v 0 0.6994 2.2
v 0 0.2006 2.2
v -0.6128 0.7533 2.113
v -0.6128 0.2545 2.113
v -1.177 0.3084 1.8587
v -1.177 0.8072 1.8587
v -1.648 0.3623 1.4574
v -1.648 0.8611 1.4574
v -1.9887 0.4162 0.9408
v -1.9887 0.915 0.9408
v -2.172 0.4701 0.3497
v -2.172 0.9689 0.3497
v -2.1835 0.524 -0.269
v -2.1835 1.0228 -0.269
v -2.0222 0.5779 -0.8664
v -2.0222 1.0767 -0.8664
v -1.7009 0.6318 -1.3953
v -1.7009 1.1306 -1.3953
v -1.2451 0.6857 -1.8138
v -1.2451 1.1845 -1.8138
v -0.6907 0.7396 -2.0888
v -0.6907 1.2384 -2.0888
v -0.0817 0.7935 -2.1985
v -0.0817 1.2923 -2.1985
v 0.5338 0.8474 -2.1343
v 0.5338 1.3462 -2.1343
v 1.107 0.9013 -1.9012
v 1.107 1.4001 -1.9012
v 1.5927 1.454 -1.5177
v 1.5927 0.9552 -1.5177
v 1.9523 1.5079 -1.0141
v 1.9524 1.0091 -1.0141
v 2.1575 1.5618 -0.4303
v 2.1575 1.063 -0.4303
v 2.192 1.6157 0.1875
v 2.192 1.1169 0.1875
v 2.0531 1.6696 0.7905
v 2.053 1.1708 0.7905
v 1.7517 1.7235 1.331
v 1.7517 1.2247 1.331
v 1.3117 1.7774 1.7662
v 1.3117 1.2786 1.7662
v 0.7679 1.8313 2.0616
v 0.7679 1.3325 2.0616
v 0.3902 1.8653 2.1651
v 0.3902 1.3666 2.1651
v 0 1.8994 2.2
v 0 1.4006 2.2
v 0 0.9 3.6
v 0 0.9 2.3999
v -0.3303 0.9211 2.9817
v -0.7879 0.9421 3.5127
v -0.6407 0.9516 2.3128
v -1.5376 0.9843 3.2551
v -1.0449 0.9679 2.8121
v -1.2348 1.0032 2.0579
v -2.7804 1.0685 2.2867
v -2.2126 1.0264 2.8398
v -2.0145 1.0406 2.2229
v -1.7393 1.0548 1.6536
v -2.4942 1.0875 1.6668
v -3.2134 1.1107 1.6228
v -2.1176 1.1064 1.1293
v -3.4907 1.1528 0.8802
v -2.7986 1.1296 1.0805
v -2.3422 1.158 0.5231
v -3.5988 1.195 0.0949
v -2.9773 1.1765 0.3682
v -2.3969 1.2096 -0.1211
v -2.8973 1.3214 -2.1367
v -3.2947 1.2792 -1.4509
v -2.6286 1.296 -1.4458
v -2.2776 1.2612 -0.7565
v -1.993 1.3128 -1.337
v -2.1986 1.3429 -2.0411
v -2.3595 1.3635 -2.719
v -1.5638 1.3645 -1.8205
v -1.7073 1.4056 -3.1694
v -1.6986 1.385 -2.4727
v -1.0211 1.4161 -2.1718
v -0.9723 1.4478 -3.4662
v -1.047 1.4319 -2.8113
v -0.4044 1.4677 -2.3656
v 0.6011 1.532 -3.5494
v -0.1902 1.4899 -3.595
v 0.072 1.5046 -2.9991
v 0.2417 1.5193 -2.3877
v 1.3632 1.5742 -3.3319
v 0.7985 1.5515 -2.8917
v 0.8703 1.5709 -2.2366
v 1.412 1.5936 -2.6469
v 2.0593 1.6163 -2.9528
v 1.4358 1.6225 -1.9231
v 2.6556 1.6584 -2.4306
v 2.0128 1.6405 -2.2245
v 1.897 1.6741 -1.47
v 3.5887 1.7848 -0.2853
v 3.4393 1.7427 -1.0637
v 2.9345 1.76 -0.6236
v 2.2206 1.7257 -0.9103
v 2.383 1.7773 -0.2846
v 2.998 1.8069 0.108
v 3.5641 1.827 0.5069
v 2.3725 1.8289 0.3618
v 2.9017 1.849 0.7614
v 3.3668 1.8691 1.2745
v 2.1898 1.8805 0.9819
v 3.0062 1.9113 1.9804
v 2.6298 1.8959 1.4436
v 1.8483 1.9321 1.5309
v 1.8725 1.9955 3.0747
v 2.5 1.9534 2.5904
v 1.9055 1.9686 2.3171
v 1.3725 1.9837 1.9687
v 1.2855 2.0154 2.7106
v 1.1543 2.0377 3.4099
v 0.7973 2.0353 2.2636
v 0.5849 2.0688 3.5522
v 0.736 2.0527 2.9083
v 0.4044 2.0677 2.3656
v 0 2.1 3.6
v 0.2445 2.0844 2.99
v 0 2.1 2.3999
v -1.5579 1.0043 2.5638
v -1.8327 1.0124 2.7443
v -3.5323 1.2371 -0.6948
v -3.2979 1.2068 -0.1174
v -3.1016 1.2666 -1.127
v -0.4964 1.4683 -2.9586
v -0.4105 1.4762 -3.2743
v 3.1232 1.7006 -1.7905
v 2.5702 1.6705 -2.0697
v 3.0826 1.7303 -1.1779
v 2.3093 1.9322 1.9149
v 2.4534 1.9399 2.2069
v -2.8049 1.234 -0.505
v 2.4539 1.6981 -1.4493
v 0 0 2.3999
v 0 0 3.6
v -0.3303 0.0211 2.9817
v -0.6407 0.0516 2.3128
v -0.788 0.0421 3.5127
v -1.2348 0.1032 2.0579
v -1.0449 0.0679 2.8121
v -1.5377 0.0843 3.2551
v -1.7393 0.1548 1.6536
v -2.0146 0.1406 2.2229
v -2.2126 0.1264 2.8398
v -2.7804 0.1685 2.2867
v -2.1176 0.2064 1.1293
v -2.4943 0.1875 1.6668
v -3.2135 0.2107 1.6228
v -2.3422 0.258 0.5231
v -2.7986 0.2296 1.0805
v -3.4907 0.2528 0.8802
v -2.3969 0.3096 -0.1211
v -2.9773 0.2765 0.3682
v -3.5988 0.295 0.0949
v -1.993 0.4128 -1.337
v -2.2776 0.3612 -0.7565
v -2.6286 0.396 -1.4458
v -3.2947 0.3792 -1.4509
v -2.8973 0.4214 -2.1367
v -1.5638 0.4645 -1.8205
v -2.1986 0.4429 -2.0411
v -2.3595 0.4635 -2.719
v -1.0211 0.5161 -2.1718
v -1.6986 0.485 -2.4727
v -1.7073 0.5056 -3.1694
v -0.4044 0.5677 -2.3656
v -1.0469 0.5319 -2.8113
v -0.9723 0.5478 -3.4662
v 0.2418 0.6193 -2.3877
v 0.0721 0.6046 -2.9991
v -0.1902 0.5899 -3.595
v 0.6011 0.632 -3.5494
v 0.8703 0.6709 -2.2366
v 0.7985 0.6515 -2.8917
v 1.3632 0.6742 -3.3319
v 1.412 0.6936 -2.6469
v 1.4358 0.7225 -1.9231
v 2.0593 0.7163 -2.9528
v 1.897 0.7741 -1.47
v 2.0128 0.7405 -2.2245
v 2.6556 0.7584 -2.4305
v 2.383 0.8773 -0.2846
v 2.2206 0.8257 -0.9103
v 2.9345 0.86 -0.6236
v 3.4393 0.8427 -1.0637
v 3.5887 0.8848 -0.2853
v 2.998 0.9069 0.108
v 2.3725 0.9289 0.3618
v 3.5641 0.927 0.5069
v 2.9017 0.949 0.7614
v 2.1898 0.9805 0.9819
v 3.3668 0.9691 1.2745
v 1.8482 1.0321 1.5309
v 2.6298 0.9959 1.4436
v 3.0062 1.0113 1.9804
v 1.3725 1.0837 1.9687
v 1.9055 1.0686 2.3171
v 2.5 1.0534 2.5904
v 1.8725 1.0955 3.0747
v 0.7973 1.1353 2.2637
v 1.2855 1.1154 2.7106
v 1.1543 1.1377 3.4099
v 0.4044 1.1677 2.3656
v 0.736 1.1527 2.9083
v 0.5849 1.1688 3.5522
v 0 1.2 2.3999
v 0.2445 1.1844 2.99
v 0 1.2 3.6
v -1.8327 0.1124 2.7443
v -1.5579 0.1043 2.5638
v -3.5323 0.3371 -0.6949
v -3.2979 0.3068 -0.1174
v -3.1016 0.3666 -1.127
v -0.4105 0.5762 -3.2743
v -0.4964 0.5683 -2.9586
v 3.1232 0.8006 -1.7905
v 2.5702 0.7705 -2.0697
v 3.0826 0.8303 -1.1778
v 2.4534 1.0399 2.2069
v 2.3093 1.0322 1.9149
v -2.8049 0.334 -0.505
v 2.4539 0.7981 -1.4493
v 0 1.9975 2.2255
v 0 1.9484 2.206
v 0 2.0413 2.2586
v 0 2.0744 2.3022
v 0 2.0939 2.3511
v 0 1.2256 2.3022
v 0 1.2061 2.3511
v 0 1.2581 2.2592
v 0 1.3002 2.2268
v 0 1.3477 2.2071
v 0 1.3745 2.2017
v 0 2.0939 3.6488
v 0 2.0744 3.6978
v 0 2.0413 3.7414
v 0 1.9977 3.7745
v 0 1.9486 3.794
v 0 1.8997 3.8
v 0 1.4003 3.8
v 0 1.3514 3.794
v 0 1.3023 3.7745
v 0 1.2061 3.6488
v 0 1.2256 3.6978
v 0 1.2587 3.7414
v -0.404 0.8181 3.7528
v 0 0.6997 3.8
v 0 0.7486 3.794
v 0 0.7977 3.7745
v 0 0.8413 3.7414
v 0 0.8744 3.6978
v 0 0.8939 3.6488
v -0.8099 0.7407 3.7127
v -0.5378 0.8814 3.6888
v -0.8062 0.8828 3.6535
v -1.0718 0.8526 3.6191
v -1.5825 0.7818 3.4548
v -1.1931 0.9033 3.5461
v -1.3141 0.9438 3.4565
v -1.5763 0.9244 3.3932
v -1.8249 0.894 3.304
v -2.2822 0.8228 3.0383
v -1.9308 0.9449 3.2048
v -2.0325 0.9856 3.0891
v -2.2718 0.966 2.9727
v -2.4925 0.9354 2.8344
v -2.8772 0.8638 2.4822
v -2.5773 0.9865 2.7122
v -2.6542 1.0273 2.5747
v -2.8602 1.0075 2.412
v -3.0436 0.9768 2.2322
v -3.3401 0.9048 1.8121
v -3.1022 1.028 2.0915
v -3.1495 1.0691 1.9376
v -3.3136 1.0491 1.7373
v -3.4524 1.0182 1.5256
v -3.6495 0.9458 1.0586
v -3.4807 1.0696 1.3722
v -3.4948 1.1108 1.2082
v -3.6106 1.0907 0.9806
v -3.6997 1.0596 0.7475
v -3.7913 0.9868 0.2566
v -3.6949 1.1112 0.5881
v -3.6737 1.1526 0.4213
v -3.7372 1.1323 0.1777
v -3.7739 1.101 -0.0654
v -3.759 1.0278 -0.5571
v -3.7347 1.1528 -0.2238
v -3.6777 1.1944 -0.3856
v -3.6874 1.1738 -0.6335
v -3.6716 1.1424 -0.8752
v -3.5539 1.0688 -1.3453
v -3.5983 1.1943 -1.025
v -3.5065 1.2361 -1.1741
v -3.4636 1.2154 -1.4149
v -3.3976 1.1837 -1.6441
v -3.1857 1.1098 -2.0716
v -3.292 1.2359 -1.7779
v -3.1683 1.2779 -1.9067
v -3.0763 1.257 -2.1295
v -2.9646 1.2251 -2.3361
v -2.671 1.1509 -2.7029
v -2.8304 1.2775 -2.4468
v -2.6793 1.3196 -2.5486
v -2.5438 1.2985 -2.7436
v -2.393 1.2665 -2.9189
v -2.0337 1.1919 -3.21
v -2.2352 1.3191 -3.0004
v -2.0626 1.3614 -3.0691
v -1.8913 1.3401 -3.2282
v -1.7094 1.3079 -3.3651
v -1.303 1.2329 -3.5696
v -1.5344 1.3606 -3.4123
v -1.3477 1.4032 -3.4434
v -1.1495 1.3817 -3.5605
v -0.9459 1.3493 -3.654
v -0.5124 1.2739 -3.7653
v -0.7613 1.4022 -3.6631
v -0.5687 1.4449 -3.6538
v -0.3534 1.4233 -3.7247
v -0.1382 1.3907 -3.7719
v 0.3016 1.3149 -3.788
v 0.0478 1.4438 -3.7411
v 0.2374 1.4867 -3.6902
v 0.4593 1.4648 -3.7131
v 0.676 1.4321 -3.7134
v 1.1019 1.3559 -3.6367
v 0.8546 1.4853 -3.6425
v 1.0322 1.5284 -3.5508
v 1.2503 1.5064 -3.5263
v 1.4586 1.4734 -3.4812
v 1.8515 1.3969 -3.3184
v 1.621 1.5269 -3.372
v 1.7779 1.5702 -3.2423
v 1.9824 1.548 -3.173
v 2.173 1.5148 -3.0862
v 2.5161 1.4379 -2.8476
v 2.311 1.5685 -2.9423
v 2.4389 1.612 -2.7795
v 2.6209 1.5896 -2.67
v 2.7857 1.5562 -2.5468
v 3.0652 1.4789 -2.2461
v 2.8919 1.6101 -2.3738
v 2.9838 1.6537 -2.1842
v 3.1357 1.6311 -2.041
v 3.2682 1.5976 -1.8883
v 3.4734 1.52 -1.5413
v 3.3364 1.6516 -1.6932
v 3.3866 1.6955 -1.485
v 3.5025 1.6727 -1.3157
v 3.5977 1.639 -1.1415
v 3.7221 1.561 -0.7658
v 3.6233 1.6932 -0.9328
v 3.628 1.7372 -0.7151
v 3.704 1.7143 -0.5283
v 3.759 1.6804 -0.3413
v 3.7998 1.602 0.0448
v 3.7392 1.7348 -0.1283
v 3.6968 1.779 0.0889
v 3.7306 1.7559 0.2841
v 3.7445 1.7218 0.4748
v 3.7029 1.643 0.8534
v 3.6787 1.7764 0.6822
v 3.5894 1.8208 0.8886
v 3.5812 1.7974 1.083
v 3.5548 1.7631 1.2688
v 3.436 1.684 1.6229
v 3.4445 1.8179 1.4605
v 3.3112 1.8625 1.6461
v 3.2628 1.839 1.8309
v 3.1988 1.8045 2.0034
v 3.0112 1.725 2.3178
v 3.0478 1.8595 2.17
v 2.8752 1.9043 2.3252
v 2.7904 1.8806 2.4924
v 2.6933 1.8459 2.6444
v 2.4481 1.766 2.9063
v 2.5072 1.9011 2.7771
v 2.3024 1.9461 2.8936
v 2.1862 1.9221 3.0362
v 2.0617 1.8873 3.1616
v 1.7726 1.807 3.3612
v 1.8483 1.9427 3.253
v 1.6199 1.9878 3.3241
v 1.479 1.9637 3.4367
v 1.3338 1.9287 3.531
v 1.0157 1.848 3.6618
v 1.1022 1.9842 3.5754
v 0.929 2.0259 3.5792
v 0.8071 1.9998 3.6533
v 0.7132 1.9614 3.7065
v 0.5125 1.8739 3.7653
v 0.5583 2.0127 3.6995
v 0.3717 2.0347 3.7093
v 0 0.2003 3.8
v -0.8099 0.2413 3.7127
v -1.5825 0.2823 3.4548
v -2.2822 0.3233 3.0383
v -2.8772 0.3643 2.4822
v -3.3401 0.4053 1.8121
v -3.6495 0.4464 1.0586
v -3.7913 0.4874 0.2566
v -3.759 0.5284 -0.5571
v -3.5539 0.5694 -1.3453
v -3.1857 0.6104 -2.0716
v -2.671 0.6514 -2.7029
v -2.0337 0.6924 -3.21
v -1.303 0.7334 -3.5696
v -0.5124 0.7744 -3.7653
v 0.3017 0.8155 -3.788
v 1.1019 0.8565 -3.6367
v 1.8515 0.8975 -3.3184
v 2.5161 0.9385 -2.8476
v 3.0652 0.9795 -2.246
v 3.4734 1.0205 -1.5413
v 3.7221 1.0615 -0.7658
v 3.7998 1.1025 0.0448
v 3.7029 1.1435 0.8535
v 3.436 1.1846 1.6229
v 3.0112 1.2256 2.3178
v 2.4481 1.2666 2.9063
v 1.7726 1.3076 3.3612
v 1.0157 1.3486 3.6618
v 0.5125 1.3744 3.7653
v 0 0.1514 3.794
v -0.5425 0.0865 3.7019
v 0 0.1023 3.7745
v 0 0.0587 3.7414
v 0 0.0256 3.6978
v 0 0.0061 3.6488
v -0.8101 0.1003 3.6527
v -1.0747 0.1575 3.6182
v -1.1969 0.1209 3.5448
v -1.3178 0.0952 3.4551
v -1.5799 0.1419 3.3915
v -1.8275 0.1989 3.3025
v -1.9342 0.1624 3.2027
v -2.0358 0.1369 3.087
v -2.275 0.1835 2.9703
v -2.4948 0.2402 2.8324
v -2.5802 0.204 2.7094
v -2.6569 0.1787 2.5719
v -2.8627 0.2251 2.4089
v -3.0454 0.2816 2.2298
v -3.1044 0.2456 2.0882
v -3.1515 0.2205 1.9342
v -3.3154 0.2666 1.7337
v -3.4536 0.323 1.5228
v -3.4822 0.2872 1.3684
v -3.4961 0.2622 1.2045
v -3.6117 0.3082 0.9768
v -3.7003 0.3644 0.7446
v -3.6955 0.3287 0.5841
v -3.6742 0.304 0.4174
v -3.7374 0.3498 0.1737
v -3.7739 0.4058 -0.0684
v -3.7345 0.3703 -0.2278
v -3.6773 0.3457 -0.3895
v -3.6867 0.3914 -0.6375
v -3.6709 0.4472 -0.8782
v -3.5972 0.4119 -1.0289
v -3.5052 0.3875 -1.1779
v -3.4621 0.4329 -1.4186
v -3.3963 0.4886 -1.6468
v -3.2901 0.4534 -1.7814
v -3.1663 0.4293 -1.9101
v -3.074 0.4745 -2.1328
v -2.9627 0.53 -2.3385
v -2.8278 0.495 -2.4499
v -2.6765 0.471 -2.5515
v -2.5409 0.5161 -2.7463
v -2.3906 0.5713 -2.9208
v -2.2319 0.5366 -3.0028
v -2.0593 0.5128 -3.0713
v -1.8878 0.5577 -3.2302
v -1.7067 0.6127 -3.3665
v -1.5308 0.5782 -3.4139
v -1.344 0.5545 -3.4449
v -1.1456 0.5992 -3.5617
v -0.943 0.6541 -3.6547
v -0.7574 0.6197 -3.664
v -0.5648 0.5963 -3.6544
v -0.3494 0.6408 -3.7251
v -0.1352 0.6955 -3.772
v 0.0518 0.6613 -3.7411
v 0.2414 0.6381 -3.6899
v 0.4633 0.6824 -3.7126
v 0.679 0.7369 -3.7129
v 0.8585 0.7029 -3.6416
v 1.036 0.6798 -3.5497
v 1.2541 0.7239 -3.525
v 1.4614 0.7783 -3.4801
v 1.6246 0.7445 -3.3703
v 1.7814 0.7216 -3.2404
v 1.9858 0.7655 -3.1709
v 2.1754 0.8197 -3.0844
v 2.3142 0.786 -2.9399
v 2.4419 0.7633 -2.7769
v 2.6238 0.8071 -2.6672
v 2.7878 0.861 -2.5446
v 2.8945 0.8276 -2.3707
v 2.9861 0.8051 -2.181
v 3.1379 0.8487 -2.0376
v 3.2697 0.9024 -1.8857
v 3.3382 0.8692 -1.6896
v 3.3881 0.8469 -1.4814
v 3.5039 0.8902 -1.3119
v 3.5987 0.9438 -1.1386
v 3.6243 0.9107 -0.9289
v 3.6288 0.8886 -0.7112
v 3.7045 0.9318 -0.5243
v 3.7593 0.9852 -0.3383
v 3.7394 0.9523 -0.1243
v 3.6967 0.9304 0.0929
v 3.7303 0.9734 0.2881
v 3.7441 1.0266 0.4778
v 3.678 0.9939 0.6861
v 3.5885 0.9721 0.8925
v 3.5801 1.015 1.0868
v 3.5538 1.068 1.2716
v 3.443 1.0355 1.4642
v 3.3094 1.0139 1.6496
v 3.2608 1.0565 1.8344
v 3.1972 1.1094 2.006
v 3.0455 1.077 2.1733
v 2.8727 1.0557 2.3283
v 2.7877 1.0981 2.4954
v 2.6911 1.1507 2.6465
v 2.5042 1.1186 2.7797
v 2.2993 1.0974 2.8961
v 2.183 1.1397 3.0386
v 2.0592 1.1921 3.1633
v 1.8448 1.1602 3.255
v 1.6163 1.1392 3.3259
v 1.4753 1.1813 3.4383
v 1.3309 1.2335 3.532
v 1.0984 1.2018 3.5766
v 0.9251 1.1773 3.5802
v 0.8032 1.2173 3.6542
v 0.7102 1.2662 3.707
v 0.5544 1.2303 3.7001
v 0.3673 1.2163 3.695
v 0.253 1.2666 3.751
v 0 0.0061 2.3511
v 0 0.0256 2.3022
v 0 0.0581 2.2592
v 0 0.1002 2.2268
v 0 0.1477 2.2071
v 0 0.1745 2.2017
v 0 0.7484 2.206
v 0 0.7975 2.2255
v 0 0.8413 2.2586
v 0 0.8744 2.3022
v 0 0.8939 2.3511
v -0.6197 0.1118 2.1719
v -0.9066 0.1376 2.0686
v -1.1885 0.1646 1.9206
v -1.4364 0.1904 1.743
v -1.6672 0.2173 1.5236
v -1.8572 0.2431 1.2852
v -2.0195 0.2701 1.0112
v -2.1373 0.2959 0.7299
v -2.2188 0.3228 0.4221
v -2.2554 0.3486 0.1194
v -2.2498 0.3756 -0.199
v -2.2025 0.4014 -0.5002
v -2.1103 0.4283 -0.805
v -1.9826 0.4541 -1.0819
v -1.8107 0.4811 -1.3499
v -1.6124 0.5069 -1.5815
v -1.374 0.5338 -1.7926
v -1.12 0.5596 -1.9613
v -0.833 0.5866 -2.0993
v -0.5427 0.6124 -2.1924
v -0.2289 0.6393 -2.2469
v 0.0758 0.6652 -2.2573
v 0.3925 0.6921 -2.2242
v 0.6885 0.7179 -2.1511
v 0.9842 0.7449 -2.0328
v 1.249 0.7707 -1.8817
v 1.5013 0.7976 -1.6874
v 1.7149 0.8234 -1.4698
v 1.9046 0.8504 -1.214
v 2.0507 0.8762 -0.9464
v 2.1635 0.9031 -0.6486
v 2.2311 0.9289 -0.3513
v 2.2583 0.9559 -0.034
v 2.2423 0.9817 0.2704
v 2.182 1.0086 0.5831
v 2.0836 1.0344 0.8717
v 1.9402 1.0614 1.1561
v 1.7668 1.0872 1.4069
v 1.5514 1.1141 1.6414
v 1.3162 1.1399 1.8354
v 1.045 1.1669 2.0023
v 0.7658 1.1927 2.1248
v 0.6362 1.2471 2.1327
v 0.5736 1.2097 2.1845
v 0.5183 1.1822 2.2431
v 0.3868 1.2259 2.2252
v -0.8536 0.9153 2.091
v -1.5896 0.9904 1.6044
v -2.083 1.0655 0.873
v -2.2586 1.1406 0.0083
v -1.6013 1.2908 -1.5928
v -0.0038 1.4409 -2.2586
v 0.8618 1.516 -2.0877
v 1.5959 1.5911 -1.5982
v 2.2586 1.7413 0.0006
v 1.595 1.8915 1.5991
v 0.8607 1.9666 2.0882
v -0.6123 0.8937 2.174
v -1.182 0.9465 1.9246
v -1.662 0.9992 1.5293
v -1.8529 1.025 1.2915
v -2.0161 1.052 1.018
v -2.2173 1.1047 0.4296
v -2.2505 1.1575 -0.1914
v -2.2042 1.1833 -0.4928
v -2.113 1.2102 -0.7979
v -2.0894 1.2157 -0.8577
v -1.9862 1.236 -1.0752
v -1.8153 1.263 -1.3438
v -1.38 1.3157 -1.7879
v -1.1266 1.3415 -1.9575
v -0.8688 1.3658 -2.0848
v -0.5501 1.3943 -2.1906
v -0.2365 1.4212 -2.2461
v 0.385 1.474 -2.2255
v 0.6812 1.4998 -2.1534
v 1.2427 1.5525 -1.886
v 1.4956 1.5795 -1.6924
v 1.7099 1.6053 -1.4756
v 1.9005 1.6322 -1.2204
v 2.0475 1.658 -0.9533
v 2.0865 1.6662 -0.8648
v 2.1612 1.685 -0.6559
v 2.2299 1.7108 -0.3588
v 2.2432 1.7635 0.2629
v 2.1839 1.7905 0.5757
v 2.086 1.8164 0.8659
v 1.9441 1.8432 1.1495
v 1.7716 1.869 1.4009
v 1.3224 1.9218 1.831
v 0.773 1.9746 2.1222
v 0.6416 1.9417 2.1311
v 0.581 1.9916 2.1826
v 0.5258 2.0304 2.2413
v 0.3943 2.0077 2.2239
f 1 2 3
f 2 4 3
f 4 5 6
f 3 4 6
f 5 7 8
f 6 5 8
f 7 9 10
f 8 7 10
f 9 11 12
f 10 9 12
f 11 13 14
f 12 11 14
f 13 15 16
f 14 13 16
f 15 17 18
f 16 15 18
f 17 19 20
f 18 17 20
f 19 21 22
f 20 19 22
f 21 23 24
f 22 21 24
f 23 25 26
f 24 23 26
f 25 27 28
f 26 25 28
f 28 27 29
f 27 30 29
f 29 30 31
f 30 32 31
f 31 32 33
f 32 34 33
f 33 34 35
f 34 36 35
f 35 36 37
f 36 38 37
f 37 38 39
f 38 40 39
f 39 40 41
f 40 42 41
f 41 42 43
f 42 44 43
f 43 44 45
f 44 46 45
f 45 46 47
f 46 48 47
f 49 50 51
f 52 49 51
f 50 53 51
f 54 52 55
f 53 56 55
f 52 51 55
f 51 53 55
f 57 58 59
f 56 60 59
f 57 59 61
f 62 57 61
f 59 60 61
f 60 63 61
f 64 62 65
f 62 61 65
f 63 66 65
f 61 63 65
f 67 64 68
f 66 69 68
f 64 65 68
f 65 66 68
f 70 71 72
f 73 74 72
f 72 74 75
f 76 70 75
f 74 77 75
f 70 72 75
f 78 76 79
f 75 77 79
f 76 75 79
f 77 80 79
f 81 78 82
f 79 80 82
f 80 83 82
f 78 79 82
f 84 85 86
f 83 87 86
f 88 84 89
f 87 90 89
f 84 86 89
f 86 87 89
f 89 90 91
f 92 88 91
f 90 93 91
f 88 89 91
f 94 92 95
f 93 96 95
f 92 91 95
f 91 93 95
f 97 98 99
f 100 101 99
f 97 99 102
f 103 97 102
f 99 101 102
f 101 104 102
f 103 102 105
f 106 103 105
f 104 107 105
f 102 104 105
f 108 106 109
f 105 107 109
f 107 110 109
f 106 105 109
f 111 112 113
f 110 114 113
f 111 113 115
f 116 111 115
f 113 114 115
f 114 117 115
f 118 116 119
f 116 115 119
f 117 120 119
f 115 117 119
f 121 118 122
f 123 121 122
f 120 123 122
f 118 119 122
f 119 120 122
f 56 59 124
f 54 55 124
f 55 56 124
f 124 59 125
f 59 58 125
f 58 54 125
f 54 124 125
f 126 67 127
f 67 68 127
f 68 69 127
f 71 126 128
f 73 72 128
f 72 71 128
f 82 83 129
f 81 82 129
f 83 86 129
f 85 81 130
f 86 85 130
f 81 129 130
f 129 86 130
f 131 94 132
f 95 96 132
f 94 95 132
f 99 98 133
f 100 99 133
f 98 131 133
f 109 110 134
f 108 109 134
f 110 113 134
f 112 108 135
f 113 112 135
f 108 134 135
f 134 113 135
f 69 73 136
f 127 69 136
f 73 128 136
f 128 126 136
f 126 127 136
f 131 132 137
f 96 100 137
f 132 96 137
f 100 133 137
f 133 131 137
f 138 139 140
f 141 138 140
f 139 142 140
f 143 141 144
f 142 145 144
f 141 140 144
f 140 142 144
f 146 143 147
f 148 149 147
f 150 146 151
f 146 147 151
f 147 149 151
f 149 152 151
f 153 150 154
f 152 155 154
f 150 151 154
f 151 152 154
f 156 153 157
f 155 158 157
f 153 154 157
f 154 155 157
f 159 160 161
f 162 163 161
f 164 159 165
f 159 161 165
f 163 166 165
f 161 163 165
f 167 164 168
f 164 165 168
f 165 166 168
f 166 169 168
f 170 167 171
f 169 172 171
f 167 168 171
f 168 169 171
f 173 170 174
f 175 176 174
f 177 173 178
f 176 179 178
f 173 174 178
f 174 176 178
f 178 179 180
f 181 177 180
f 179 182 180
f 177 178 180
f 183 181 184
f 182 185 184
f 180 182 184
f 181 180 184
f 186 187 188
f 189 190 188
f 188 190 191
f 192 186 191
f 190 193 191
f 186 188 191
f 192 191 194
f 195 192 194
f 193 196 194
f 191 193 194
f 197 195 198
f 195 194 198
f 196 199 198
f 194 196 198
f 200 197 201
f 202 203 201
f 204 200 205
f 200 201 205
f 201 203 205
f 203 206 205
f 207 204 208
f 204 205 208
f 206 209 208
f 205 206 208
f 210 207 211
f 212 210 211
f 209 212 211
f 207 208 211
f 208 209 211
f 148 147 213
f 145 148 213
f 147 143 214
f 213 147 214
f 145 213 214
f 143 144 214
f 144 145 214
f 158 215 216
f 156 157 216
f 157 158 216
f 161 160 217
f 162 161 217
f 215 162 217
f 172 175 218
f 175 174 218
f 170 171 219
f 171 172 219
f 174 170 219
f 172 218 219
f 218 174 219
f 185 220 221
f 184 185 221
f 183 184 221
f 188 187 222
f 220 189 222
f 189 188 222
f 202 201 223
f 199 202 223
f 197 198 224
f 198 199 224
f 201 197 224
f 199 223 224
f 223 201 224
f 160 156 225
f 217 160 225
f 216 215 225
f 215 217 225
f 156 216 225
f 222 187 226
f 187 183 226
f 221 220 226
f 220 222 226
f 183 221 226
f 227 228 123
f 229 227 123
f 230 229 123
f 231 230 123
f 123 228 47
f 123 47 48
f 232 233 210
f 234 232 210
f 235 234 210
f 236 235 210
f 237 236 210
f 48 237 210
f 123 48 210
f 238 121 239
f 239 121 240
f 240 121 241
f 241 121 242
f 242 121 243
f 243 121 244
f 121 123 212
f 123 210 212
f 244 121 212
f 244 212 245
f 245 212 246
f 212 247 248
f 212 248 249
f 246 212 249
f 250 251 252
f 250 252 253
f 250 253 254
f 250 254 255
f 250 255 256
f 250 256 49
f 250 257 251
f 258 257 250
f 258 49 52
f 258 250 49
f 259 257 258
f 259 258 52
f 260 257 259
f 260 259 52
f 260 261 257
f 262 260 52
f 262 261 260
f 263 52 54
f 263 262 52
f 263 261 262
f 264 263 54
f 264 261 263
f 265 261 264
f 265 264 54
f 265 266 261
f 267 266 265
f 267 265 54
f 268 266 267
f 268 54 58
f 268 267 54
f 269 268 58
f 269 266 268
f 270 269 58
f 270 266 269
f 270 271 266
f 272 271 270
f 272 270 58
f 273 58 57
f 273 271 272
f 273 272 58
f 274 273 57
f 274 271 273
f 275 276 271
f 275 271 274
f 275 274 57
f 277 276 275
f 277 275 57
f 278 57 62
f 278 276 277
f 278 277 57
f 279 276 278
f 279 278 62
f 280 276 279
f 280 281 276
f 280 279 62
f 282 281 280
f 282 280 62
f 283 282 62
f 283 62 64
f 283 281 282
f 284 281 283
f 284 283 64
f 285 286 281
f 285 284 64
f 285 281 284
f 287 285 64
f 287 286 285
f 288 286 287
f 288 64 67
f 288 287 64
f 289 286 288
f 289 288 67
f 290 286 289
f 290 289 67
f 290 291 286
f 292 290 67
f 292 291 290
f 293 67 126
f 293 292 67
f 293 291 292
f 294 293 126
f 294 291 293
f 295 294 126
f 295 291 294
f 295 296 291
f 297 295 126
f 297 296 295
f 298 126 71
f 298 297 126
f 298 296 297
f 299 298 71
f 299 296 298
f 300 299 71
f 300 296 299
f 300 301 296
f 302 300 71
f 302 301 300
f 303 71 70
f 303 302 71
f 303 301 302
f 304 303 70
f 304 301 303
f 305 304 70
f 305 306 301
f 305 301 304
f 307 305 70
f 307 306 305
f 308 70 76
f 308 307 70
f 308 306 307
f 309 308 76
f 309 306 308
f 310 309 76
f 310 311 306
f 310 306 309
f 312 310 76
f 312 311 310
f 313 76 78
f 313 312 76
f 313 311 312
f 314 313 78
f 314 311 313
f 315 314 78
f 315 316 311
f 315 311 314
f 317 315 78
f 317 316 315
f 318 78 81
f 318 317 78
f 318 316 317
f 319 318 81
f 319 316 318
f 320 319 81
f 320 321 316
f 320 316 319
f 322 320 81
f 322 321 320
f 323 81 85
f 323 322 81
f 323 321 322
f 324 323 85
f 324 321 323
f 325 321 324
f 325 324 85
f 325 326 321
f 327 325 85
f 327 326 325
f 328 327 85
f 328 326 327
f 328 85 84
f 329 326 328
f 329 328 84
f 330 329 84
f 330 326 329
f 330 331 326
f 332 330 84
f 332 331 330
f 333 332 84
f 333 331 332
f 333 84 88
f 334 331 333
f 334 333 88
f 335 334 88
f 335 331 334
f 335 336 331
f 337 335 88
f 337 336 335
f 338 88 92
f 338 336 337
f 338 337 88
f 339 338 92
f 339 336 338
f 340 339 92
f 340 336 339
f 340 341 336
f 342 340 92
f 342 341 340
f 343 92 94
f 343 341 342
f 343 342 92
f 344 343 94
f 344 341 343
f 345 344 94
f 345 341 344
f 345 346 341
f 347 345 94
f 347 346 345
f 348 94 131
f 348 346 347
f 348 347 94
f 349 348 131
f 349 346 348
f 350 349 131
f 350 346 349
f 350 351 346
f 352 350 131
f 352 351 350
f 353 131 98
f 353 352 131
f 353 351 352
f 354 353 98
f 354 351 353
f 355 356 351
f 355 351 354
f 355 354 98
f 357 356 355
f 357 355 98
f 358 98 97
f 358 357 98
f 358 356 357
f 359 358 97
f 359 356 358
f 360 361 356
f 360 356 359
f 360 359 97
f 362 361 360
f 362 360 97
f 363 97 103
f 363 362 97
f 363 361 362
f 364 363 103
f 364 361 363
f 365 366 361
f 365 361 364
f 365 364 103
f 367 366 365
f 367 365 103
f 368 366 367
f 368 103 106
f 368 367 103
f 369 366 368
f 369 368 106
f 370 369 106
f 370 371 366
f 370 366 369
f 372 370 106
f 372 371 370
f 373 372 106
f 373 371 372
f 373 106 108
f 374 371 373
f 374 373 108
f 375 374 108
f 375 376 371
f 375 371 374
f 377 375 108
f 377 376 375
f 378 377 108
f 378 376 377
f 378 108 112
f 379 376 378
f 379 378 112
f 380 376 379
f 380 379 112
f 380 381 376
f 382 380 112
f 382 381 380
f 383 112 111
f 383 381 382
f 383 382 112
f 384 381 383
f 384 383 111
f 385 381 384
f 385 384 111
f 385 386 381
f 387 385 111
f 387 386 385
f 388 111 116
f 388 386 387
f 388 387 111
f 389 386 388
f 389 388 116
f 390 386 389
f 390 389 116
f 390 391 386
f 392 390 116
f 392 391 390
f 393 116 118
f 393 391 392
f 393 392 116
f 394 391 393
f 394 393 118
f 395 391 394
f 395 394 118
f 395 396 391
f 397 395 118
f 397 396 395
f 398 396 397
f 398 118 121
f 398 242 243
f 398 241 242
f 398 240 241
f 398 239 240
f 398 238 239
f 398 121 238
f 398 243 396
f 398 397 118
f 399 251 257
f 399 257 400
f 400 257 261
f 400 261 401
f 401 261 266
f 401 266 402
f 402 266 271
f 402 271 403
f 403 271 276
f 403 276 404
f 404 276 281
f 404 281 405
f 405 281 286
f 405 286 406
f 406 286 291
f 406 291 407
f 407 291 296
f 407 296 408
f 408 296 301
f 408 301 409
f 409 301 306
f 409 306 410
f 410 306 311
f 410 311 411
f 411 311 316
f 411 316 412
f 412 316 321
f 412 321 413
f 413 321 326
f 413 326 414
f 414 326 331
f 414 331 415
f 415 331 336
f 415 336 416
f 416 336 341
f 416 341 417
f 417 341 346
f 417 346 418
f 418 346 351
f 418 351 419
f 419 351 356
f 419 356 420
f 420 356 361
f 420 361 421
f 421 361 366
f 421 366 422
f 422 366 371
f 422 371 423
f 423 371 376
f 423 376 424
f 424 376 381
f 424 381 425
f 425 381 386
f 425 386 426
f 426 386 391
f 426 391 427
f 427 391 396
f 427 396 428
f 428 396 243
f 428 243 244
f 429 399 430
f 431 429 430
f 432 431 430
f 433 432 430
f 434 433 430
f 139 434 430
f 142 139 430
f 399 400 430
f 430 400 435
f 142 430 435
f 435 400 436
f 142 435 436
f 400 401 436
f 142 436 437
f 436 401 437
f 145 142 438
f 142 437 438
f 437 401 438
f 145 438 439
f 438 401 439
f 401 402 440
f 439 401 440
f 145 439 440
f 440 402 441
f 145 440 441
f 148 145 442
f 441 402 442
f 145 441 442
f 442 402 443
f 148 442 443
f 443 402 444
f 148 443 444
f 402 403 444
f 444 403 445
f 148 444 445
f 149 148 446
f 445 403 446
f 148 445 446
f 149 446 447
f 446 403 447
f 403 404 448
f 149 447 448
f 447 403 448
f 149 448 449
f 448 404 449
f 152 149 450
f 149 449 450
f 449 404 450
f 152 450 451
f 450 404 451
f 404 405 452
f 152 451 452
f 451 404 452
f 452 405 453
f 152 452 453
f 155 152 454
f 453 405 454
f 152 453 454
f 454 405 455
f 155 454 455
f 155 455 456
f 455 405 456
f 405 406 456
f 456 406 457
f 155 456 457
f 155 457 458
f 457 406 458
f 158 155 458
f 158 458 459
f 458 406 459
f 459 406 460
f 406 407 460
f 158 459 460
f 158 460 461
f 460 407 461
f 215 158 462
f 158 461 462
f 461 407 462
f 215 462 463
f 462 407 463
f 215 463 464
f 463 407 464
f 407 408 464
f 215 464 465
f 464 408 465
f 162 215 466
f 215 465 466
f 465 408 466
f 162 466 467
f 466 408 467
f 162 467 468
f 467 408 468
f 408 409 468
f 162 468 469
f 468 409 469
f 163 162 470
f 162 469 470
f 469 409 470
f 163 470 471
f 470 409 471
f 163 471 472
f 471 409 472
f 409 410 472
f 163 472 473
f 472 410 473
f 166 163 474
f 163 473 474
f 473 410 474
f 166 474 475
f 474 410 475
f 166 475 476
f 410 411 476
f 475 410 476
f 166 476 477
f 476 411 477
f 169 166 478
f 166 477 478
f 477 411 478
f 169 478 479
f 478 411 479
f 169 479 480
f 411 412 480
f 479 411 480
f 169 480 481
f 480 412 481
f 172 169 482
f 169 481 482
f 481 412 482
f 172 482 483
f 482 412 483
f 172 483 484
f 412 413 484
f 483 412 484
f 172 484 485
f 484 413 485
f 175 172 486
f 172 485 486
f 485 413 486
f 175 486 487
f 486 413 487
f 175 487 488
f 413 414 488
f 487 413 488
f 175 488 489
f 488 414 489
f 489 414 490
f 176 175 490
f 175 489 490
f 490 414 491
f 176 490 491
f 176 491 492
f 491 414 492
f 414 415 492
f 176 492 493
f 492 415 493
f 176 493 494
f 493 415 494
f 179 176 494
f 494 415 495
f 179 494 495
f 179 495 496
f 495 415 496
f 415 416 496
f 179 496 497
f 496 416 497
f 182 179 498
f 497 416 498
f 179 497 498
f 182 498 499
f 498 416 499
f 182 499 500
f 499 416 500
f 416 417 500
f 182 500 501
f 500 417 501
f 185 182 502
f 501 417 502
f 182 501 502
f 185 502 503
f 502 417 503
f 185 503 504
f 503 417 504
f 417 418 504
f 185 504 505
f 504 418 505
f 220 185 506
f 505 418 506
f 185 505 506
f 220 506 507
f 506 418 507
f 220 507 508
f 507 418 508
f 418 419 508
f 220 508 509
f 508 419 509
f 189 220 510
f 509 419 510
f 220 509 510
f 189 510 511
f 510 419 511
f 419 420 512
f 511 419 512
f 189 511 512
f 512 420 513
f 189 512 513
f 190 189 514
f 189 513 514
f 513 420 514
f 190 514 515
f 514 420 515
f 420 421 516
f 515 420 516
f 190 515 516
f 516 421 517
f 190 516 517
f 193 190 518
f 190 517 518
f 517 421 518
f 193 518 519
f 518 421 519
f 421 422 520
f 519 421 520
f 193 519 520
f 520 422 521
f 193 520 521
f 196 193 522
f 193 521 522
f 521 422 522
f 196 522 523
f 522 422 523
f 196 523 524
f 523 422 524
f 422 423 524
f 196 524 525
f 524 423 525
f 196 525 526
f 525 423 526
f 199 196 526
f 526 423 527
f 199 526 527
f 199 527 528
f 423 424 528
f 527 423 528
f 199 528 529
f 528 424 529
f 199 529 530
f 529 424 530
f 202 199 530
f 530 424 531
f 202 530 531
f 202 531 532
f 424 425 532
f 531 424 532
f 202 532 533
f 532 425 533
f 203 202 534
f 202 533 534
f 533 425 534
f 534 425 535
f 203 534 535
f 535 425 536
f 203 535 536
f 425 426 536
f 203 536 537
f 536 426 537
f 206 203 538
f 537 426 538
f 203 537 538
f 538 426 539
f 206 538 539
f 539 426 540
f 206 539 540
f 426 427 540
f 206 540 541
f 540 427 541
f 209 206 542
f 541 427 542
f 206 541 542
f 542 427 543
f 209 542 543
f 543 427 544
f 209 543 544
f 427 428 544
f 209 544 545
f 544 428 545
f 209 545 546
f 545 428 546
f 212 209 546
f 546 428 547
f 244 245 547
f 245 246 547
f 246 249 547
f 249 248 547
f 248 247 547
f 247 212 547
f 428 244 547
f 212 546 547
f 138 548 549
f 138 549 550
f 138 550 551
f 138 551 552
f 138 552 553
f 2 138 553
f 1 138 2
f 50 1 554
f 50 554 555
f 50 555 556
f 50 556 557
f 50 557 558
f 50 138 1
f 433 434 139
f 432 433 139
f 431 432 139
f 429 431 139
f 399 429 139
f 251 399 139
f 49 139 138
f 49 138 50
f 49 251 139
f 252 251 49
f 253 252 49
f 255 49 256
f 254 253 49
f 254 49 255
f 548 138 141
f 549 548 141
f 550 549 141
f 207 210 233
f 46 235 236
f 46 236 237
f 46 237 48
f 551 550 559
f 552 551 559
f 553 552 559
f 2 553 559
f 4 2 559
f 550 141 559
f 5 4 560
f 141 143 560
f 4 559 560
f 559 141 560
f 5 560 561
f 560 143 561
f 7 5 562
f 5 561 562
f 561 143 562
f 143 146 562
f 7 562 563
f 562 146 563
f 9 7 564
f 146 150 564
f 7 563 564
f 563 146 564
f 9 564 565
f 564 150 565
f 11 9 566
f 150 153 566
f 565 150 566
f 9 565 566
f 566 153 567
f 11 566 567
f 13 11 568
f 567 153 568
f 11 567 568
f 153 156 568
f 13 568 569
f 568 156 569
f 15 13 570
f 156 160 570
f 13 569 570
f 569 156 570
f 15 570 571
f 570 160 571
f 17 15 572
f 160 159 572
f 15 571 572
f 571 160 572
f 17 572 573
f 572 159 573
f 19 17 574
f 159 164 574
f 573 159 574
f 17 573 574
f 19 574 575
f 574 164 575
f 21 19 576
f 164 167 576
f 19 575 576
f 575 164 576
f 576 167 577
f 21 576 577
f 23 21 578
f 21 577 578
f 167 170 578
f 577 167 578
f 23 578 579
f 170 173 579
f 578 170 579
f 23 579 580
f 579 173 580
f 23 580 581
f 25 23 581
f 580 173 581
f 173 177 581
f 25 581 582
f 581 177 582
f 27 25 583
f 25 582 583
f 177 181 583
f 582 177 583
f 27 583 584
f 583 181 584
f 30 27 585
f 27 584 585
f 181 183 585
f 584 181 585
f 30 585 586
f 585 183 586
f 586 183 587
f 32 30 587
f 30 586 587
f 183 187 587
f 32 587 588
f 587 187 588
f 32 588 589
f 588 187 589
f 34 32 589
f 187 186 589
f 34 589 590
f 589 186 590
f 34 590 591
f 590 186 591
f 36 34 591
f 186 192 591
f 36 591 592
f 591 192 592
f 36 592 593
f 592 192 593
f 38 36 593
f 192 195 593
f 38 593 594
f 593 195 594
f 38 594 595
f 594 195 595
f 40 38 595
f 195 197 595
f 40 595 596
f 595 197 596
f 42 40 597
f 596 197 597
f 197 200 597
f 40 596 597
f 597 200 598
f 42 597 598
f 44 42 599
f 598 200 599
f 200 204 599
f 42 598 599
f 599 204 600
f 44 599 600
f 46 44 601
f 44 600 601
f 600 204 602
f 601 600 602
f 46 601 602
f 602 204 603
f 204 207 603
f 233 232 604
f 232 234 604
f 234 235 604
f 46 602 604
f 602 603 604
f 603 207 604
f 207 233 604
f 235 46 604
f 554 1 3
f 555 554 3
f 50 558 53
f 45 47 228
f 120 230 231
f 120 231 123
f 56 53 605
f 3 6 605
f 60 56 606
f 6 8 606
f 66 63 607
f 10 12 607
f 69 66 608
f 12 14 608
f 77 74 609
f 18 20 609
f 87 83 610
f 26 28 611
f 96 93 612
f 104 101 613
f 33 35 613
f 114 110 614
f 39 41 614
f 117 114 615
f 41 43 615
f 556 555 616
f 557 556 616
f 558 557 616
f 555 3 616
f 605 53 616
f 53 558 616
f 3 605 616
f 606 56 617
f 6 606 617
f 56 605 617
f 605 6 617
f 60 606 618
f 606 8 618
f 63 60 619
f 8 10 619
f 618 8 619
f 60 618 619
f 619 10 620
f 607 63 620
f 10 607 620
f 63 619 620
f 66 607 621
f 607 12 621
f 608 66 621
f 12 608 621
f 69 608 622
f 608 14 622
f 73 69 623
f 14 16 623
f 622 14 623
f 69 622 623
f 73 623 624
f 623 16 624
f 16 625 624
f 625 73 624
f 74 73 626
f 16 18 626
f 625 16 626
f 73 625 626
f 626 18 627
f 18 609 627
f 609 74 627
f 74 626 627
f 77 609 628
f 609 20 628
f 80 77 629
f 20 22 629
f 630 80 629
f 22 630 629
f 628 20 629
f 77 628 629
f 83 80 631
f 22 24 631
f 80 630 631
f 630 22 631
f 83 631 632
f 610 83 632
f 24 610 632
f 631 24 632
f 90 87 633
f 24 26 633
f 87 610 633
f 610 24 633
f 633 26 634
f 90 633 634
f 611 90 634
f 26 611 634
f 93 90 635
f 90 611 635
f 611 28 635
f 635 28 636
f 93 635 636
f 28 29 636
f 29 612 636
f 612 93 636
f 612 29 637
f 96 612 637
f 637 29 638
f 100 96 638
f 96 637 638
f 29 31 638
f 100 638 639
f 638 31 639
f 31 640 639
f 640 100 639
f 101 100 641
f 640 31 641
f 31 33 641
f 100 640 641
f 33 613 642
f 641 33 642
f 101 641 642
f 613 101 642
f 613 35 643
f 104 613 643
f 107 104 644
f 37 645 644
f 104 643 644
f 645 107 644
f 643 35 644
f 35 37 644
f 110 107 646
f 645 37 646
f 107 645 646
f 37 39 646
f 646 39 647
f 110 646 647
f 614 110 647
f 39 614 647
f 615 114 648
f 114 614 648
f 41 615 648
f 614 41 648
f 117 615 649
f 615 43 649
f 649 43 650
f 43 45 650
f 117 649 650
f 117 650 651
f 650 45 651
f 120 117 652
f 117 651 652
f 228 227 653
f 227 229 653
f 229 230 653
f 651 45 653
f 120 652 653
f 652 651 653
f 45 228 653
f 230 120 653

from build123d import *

# Parameters (mm, degrees)
SWEEP1_PITCH  = 1.2
SWEEP1_HEIGHT = 1.2
SWEEP1_RADIUS = 2.2
SKETCH2_W     = 1.6
SKETCH2_H     = 0.9
FILLET1_R     = 0.2


with BuildPart() as part:
    # Sweep1: sweep along a helix
    with BuildLine() as sweep1_path:
        Helix(SWEEP1_PITCH, SWEEP1_HEIGHT, SWEEP1_RADIUS, center=(0, 0, 0), direction=(0, 1, 0), lefthand=True)
    # Sketch2 → Sweep1 (sweep)
    with BuildSketch(Plane(origin=(0, 0, 0), x_dir=(0, 0, -1), z_dir=(1, 0, 0))):
        with Locations((-3, 0.45)):
            Rectangle(SKETCH2_W, SKETCH2_H)
    sweep(path=sweep1_path.line, is_frenet=True)

    # Fillet1
    fillet1_edges = [part.edges().sort_by_distance(p)[0] for p in [
        (0, 0.6, -3.799995909),
        (0, 0.6, -2.199997632),
        (0, 1.5, -2.199997632),
        (0, 1.5, -3.799995909),
    ]]
    fillet(fillet1_edges, radius=FILLET1_R)


solid = part.part
